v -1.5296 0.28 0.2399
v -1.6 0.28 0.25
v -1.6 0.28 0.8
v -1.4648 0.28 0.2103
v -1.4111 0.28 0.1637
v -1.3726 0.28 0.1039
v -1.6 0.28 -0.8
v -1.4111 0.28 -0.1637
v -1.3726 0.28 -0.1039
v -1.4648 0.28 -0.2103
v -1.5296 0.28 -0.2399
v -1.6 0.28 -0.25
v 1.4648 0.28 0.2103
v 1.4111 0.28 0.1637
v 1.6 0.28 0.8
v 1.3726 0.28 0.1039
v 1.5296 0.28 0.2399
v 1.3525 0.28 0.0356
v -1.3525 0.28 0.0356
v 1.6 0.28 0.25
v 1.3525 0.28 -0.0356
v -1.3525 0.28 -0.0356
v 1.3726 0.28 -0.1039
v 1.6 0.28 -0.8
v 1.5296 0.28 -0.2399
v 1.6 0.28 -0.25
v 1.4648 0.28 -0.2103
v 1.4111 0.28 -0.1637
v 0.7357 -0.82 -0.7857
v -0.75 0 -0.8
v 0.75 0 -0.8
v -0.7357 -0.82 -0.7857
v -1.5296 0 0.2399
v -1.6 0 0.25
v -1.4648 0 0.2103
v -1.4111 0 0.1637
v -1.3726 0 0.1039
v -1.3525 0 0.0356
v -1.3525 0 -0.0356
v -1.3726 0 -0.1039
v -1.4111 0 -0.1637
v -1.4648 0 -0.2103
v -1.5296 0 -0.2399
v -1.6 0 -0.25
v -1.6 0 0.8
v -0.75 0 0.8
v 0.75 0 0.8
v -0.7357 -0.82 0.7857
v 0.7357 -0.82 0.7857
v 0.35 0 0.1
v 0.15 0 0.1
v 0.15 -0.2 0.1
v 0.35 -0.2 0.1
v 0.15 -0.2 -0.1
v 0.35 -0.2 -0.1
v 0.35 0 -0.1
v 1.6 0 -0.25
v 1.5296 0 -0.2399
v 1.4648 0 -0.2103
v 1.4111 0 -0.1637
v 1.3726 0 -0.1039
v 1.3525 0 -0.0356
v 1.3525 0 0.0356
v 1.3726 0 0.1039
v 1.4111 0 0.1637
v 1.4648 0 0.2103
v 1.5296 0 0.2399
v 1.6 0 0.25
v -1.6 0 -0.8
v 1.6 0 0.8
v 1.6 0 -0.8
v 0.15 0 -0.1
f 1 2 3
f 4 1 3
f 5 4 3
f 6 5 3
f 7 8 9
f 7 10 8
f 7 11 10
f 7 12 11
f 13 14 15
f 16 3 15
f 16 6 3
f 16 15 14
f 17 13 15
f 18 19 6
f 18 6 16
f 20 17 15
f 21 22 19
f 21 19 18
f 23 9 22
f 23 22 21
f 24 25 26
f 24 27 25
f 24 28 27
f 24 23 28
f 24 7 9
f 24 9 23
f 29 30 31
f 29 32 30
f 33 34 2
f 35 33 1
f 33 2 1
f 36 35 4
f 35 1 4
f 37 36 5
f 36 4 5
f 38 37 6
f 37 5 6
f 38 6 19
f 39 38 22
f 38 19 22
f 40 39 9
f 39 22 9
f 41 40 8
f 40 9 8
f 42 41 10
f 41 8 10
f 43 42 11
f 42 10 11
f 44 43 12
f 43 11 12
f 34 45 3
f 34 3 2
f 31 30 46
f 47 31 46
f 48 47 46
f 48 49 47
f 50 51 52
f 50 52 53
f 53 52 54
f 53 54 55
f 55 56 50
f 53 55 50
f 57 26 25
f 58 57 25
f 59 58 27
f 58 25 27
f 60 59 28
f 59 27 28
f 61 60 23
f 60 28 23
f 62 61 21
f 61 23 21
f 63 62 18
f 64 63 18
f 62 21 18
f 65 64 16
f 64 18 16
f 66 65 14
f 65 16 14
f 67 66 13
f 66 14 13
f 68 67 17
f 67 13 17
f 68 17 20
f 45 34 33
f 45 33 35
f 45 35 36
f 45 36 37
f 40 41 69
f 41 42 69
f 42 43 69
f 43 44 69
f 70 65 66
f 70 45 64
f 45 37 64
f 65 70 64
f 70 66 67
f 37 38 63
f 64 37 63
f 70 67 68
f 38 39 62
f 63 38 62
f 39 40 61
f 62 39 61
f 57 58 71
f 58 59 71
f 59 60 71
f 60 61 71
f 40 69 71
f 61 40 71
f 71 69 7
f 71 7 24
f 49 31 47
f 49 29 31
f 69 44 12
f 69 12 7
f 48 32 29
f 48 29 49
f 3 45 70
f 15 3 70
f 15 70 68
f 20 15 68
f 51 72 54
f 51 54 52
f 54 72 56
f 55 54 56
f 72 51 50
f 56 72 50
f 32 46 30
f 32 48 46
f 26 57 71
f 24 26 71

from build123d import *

# Parameters (mm, degrees)
SKETCH1_W           = 3.2
SKETCH1_H           = 1.6
BOSS_EXTRUDE1_DEPTH = 0.28
SKETCH2_W           = 1.5
SKETCH2_H           = 1.6
BOSS_EXTRUDE2_DEPTH = 0.82
BOSS_EXTRUDE2_TAPER = 1
SKETCH3_W           = 0.2
SKETCH3_H           = 0.2
BOSS_EXTRUDE3_DEPTH = 0.2
SKETCH6_R           = 0.25
CUT_EXTRUDE1_DEPTH  = 3.10000009


with BuildPart() as part:
    # Sketch1 → Boss-Extrude1 (new body)
    with BuildSketch(Plane(origin=(0, 0, 0), x_dir=(1, 0, 0), z_dir=(0, 1, 0))):
        Rectangle(SKETCH1_W, SKETCH1_H)
    extrude(amount=BOSS_EXTRUDE1_DEPTH)

    # Sketch6 → Cut-Extrude1 (cut, through all)
    with BuildSketch(Plane(origin=(0, 0.28, 0), x_dir=(1, 0, 0), z_dir=(0, 1, 0))):
        with Locations((-1.6, 0)):
            Circle(SKETCH6_R)
        with Locations((1.6, 0)):
            Circle(SKETCH6_R)
    extrude(amount=-CUT_EXTRUDE1_DEPTH, mode=Mode.SUBTRACT)


with BuildPart() as body_2:
    # Sketch2 → Boss-Extrude2 (new body)
    with BuildSketch(Plane.XZ):
        Rectangle(SKETCH2_W, SKETCH2_H)
    extrude(amount=BOSS_EXTRUDE2_DEPTH, taper=BOSS_EXTRUDE2_TAPER)


with BuildPart() as body_3:
    # Sketch3 → Boss-Extrude3 (new body)
    with BuildSketch(Plane.XZ):
        with Locations((0.25, 0)):
            Rectangle(SKETCH3_W, SKETCH3_H)
    extrude(amount=BOSS_EXTRUDE3_DEPTH)


solid = Compound([part.part, body_2.part, body_3.part])
